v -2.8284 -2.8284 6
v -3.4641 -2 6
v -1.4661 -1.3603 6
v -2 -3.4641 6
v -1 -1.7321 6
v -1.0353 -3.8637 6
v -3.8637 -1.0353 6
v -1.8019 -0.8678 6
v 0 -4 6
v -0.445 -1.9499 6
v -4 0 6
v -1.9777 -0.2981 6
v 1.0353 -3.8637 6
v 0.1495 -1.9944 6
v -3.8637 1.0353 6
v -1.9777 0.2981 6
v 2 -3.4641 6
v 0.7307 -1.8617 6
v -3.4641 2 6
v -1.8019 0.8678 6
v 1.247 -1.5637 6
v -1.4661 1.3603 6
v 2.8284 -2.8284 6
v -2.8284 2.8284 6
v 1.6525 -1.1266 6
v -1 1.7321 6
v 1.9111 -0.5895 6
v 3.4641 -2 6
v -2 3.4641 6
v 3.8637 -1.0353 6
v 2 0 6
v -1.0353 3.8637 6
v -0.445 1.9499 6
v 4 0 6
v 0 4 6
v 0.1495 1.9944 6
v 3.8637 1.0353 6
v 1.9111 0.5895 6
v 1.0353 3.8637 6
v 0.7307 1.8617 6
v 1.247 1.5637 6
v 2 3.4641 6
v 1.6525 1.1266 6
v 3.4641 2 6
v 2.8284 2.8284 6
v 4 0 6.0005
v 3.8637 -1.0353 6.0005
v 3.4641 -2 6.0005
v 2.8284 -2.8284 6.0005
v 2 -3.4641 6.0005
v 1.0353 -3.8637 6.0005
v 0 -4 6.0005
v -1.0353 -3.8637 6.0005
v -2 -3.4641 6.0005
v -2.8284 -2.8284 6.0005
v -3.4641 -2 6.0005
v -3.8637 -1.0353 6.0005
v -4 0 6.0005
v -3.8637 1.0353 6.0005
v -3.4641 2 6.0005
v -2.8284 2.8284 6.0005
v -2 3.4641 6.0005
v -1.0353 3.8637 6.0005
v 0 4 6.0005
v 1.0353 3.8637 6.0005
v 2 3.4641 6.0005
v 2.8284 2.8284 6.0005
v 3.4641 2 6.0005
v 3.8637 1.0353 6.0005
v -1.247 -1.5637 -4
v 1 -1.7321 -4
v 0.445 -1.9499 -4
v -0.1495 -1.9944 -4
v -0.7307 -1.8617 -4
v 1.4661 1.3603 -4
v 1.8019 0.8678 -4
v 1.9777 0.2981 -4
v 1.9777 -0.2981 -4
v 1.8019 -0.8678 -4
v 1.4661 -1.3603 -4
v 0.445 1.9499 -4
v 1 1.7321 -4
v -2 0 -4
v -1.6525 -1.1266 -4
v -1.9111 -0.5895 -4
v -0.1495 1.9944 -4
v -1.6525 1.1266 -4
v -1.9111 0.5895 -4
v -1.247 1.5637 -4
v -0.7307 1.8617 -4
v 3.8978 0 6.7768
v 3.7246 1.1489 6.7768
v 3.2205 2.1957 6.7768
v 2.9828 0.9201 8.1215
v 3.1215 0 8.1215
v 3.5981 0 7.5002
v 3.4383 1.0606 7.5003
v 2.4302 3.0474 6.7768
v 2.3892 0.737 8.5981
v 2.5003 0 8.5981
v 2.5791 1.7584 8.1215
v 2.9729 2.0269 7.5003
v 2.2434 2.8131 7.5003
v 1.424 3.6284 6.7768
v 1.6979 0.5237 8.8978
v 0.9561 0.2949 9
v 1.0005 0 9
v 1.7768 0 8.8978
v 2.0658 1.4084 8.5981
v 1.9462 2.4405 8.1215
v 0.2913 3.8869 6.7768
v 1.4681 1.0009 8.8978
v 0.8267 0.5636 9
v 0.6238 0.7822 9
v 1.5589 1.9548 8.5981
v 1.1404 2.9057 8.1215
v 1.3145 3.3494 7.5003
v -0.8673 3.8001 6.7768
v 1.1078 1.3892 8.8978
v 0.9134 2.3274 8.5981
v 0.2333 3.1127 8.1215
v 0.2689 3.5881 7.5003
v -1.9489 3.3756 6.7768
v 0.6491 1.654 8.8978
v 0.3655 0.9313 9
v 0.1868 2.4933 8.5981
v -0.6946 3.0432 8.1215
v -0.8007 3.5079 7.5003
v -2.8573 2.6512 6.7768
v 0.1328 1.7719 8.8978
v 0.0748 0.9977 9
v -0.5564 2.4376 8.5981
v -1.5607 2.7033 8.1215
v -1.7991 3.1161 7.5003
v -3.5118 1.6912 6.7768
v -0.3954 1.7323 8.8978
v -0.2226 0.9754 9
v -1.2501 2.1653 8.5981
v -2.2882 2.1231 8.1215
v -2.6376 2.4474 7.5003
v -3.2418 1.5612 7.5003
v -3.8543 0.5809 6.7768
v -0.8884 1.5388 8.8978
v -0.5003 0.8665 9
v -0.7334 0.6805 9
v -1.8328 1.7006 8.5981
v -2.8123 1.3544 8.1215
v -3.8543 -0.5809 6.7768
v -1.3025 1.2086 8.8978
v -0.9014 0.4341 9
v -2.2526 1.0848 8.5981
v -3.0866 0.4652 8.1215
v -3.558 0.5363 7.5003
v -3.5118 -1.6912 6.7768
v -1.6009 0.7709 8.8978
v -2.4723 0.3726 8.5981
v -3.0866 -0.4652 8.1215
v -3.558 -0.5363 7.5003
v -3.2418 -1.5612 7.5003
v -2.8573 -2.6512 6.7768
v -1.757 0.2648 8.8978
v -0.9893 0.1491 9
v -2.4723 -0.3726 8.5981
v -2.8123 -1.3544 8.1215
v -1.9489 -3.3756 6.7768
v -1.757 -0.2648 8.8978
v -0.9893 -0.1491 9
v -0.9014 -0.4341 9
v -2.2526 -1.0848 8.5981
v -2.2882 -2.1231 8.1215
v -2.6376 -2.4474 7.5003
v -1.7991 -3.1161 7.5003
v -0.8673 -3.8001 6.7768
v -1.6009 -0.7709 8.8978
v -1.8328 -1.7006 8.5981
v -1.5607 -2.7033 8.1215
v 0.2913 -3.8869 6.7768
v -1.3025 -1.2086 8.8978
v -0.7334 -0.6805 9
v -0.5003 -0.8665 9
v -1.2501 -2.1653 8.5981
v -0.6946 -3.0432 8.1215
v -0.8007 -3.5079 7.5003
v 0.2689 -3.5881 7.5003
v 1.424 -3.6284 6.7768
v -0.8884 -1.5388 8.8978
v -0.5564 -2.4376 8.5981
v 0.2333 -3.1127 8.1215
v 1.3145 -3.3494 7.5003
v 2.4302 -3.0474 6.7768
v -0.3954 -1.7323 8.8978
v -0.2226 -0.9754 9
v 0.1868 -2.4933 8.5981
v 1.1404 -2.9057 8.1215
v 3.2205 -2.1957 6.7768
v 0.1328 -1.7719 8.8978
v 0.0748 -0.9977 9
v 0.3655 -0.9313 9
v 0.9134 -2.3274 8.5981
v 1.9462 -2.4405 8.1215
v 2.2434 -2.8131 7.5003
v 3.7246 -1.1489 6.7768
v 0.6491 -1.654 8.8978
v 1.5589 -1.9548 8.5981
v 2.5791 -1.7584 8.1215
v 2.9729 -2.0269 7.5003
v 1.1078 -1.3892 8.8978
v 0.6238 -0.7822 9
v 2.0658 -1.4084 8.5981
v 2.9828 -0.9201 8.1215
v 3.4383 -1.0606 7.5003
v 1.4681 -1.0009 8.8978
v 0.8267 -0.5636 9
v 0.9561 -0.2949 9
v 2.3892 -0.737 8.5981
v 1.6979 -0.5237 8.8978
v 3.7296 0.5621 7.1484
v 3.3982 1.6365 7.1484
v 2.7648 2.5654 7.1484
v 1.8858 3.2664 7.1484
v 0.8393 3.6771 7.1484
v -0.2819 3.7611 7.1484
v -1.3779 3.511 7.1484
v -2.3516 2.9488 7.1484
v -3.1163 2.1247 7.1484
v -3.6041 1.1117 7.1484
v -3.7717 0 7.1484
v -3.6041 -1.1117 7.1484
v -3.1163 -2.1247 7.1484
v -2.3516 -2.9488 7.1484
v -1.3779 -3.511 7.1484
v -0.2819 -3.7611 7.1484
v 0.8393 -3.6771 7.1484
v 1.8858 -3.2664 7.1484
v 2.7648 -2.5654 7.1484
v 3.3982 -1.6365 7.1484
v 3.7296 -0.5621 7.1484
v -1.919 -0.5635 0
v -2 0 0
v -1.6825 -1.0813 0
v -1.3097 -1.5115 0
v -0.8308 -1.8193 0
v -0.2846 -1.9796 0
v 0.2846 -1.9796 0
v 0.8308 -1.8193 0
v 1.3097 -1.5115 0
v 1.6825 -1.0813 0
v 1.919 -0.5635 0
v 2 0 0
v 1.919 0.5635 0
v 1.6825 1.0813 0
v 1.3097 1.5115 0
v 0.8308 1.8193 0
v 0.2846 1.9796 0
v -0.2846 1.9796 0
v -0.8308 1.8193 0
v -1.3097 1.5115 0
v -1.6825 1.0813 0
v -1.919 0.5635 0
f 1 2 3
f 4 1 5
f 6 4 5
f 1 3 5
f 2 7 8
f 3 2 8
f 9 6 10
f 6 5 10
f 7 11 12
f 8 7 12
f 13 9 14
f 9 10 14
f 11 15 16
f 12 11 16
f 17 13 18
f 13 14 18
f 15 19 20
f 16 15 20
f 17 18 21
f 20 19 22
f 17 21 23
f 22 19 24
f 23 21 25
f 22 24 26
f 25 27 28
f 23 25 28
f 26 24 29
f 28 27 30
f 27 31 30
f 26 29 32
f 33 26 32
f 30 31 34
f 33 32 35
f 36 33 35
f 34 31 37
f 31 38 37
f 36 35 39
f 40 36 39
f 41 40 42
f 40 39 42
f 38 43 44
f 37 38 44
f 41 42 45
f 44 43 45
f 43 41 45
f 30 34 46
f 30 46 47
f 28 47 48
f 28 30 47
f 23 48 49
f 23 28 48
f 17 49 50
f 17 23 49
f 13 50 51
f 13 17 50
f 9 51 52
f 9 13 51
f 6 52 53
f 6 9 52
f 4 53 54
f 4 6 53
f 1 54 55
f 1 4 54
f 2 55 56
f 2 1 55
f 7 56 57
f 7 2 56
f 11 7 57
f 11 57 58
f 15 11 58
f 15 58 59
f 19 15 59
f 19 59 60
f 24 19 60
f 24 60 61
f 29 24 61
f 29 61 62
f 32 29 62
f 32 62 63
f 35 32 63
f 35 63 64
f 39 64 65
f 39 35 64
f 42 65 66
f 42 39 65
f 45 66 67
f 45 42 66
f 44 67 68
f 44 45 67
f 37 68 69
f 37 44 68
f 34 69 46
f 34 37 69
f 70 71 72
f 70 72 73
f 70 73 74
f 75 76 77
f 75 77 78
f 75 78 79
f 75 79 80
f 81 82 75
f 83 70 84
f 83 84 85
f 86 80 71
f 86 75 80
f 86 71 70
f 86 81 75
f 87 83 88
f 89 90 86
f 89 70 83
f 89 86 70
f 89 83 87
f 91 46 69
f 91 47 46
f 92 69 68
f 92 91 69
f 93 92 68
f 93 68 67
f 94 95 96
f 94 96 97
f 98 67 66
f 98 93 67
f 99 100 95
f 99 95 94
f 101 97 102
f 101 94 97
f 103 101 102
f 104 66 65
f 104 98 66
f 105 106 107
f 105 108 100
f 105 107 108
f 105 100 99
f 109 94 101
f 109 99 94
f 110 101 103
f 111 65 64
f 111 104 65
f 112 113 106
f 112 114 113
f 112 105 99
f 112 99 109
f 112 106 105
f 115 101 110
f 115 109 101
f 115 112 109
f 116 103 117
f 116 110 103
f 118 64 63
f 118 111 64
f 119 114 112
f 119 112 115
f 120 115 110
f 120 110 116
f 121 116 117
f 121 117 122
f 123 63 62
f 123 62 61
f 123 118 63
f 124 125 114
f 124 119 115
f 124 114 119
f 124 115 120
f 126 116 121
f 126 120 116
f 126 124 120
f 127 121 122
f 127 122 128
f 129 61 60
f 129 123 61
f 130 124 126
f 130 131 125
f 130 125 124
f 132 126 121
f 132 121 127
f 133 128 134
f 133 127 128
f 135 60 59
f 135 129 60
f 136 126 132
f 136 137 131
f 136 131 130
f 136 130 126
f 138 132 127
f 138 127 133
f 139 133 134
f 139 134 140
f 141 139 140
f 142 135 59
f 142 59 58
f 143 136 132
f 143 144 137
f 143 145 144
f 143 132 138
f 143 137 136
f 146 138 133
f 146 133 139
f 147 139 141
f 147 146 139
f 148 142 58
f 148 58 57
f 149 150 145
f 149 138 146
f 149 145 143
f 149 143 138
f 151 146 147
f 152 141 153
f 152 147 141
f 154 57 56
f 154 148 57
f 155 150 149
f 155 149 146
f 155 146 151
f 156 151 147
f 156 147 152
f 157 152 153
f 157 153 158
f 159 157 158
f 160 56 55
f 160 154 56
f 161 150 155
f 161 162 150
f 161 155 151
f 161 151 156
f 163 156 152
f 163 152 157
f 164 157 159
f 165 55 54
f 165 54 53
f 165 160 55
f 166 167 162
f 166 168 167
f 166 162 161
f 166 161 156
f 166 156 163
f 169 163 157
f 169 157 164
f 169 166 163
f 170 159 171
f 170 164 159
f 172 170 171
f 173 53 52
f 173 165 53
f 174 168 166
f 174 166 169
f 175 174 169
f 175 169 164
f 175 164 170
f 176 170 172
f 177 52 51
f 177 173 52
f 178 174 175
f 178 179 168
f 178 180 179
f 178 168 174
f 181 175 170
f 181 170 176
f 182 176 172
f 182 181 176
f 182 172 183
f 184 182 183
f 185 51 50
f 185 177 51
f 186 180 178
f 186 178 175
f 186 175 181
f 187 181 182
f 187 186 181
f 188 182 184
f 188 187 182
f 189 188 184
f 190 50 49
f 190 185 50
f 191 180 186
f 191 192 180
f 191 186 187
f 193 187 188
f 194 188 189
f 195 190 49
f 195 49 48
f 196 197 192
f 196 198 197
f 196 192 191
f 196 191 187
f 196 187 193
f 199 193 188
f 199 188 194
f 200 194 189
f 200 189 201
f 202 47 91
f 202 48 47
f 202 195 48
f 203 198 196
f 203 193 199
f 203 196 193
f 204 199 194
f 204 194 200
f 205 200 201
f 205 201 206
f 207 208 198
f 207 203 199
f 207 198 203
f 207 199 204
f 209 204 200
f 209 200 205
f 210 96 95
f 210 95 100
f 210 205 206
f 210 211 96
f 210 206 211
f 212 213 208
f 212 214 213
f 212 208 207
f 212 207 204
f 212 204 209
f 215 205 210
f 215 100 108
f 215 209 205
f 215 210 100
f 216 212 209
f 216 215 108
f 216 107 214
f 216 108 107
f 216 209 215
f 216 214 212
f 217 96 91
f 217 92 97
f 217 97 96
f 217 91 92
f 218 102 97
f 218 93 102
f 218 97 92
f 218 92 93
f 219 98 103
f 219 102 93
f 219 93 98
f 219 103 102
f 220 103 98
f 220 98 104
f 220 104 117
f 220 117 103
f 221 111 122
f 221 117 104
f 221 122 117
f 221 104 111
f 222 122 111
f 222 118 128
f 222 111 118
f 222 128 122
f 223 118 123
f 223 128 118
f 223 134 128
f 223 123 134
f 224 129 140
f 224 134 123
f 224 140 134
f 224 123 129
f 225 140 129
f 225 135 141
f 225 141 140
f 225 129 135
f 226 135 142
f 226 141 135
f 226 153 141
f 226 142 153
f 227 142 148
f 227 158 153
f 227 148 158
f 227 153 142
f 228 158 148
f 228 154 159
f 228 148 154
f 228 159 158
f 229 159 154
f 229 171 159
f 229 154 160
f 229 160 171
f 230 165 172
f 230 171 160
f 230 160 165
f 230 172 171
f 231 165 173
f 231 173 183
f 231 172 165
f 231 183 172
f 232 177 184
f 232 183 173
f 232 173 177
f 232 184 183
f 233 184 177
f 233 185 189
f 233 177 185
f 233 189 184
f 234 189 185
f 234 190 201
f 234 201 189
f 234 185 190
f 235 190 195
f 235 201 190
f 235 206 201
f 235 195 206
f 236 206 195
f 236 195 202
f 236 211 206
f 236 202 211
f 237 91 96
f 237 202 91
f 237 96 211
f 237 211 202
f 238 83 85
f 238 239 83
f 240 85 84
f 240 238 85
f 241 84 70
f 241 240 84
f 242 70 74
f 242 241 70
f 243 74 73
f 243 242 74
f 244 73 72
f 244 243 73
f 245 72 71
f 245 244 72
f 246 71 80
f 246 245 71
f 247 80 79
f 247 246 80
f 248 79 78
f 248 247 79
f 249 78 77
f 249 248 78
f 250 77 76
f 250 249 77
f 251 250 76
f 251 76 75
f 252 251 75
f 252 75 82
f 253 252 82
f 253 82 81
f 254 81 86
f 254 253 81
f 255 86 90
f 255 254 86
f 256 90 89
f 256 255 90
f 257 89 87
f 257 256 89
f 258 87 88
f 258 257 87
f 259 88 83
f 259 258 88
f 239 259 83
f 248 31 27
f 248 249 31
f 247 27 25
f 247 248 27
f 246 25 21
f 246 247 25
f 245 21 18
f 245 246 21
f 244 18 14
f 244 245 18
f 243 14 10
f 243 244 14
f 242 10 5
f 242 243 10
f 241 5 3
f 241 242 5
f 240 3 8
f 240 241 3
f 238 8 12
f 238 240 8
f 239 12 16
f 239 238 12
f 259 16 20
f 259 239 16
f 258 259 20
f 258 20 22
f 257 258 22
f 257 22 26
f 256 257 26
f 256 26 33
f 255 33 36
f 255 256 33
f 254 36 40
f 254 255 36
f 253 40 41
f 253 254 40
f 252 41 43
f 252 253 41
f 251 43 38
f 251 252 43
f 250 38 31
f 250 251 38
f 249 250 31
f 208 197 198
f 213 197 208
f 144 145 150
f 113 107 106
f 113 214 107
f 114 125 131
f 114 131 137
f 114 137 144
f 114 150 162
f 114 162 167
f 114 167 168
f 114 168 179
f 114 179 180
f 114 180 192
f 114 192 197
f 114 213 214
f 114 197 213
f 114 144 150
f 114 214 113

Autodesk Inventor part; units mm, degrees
ref_plane "YZ Plane" through (0, 0, 0) normal (1, 0, 0) x (0, 1, 0)
ref_plane "XZ Plane" through (0, 0, 0) normal (0, 1, 0) x (-1, 0, 0)
ref_plane "XY Plane" through (0, 0, 0) normal (0, 0, 1) x (1, 0, 0)
sketch "スケッチ1" plane through (0, 0, 0) normal (0, 0, 1) x (1, 0, 0)
  circle A0 centre (0, 0) radius 2
  dimension "d0" = 4
extrude "押し出し1" add sketch "スケッチ1" along normal blind 6
sketch "スケッチ2" plane through (0, 0, 6) normal (0, 0, 1) x (1, 0, 0)
  circle A0 centre (0, 0) radius 2 projected
  circle A1 centre (0, 0) radius 4
  dimension "d3" = 8
extrude "押し出し2" add sketch "スケッチ2" along normal blind 3 contours A0 | A1
fillet "フィレット1" radius 3 1 edges at (-4, 0, 9)
thread "ねじ1" size "M4x0.7" class "6g" standard "ANSI Metric M Profile" full length
sketch "スケッチ3" plane through (0, 0, 0) normal (0, 0, -1) x (-1, 0, 0)
  circle A0 centre (0, 0) radius 2
extrude "押し出し3" add sketch "スケッチ3" along normal blind 4
properties part number "SB　M4 10mm なべネジ" material "Stainless Steel, 440C"
